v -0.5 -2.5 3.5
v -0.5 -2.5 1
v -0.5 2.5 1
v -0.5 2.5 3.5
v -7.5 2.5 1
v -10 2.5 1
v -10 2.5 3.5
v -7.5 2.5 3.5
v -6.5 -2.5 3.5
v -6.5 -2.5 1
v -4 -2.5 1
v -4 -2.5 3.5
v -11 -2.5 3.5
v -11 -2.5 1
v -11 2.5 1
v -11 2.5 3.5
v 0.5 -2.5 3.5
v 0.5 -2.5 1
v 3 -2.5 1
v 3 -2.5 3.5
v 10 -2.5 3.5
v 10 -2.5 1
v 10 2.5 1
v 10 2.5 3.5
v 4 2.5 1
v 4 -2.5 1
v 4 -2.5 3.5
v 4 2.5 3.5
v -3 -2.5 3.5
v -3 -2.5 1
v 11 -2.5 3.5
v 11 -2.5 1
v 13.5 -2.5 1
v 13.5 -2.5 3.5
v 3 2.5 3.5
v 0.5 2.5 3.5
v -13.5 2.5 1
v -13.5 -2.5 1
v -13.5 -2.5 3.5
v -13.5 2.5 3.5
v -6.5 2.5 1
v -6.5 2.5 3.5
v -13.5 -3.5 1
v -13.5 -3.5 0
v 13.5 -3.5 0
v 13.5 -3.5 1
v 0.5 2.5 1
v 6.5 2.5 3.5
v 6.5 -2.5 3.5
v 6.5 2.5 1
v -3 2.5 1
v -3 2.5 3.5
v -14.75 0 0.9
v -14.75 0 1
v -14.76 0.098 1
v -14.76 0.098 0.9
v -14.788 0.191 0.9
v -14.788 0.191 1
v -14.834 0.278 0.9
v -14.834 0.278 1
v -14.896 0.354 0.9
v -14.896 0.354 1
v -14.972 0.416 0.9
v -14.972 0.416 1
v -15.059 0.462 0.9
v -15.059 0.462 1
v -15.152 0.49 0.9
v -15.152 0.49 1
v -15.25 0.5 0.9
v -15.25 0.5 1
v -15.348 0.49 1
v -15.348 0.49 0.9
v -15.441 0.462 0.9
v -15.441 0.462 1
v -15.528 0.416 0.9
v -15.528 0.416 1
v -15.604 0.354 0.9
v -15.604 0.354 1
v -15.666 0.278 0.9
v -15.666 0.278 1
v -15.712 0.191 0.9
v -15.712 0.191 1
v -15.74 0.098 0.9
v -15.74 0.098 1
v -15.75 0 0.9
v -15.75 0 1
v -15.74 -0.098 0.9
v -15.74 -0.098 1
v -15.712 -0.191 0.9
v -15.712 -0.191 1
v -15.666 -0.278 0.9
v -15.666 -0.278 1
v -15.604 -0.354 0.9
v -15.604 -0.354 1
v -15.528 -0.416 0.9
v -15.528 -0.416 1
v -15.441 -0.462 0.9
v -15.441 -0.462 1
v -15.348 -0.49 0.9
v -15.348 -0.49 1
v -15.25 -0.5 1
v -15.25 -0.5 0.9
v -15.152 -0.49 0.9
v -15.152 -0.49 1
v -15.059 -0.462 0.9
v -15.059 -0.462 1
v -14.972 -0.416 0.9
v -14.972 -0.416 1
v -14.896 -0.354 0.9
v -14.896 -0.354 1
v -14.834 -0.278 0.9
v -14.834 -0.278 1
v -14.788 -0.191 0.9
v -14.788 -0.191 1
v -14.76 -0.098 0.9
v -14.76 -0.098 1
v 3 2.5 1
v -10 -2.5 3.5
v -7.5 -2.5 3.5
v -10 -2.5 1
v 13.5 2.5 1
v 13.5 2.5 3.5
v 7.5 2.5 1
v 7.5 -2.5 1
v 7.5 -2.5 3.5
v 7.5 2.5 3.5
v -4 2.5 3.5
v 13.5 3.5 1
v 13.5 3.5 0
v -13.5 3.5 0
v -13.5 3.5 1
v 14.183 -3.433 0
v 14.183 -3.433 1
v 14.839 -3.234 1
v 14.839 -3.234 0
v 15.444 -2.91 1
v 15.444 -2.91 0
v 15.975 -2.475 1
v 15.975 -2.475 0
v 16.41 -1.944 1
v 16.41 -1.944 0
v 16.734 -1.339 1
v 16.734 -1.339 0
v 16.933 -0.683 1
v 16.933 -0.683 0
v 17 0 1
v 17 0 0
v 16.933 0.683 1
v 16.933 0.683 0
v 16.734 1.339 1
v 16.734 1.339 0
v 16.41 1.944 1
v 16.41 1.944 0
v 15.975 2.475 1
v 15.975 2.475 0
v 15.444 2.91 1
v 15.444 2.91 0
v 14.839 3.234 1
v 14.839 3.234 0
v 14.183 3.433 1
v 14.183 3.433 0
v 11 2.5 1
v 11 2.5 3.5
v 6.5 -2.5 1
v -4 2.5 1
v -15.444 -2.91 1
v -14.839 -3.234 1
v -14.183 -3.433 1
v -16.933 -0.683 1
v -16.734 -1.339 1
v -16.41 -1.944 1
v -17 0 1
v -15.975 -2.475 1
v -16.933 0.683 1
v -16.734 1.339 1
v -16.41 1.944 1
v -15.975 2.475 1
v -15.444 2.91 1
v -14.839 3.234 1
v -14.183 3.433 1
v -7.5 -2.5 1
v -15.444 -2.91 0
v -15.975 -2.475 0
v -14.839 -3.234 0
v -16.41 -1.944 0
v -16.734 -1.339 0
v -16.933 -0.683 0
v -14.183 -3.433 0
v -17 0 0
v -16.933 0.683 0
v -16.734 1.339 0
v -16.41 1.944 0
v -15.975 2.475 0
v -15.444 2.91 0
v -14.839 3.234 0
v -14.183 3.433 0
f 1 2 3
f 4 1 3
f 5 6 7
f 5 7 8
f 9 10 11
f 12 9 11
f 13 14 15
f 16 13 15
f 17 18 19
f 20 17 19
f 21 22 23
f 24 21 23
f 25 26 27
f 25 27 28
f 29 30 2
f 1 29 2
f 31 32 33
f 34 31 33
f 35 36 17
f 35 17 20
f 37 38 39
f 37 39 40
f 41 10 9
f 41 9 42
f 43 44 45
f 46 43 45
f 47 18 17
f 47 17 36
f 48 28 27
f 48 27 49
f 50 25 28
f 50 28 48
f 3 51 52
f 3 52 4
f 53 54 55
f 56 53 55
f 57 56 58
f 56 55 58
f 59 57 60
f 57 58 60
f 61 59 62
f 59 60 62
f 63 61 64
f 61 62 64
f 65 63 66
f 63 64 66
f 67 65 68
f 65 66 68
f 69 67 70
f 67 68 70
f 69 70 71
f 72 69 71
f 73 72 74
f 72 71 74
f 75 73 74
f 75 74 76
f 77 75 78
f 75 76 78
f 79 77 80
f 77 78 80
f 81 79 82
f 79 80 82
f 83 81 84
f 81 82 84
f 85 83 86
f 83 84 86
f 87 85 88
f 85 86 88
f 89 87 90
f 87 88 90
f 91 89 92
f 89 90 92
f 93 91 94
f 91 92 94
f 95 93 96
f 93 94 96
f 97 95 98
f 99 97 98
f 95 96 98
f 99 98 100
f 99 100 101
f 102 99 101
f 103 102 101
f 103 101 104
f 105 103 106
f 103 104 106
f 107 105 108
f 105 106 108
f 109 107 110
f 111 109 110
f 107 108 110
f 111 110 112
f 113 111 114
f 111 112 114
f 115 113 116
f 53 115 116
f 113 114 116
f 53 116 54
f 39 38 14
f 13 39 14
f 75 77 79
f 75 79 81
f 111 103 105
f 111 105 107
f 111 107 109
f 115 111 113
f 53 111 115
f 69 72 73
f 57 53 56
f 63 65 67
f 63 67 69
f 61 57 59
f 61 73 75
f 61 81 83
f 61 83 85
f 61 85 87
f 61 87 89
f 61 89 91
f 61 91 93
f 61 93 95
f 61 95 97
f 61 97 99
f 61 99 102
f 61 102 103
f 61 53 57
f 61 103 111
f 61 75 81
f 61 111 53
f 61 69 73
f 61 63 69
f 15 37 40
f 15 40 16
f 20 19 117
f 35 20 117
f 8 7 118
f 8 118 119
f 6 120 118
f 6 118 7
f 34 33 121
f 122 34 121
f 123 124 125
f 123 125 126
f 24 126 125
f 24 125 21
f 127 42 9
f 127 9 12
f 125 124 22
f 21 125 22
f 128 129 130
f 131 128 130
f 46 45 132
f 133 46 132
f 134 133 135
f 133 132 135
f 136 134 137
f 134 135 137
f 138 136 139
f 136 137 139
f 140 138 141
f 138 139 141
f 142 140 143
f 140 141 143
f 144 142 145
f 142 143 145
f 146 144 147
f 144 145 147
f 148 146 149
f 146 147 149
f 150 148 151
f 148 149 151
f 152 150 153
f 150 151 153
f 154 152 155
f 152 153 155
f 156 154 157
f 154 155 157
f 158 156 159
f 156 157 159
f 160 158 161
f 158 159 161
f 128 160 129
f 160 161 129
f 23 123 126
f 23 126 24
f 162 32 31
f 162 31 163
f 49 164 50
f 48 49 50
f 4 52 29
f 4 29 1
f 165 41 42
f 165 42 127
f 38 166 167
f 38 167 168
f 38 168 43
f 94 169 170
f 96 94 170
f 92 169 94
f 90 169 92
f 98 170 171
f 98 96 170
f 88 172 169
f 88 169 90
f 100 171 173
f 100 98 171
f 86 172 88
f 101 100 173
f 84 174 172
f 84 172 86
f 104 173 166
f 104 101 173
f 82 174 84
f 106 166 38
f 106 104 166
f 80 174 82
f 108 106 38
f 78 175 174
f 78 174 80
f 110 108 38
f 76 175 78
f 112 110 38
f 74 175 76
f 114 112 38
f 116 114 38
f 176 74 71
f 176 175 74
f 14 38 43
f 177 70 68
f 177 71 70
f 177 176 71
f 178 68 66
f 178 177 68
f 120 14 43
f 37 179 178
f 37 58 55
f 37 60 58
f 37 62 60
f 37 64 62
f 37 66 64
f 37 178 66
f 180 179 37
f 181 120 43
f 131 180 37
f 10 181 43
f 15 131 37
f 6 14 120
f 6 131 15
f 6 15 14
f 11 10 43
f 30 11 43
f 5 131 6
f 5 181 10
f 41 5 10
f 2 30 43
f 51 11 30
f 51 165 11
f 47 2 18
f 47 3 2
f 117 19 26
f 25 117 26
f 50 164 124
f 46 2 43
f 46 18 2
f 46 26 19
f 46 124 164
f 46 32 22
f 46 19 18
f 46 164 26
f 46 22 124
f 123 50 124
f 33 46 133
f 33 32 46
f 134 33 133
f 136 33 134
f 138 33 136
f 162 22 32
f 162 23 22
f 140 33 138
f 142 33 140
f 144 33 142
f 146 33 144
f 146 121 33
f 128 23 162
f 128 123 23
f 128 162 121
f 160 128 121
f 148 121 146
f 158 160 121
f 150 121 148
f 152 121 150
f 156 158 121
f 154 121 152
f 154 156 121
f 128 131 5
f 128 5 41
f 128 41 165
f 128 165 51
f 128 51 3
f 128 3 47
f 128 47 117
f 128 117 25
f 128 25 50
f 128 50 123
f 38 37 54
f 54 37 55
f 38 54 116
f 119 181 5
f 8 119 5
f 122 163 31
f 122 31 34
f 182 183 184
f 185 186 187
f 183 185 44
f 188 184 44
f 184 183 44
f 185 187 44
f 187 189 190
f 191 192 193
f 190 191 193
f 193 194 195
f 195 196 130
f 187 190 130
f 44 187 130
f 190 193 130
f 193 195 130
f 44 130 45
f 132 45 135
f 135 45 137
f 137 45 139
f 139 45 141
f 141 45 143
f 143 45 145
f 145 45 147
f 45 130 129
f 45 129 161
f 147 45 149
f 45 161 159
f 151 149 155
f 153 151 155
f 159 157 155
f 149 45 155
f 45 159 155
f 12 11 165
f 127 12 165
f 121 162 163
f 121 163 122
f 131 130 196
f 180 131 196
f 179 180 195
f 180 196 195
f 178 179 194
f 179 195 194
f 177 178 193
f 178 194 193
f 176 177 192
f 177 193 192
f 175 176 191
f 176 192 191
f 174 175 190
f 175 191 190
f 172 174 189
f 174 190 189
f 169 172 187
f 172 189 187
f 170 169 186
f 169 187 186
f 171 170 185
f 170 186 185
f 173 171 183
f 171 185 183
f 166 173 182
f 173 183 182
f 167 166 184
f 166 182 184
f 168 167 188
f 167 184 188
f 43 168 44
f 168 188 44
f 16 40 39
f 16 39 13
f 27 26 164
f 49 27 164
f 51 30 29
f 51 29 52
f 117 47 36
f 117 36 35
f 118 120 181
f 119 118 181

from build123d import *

# Parameters (mm, degrees)
F1_DEPTH = 1
F2_W     = 2.5
F2_H     = 5
F3_DEPTH = 2.5
F5_DEPTH = 0.1


# Not quite as in the source:
# - a feature names something its author has since deleted; it is built from what else it names


with BuildPart() as f1:
    # F0 (on Top) → F1 (new body)
    with BuildSketch(Plane.XY):
        with BuildLine():
            Line((0, 3.5), (-13.5, 3.5))
            ThreePointArc((-13.5, 3.5), (-17, 0), (-13.5, -3.5))
            Line((-13.5, -3.5), (0, -3.5))
            Line((0, -3.5), (13.5, -3.5))
            ThreePointArc((13.5, -3.5), (17, 0), (13.5, 3.5))
            Line((13.5, 3.5), (0, 3.5))
        make_face()
    extrude(amount=F1_DEPTH)

    # F2 (on face) → F3 (join)
    with BuildSketch(Plane.XY.offset(1)):
        with Locations((-12.25, 0)):
            Rectangle(F2_W, F2_H)
        with Locations((12.25, 0)):
            Rectangle(F2_W, F2_H)
        with Locations((-8.75, 0)):
            Rectangle(F2_W, F2_H)
        with Locations((-5.25, 0)):
            Rectangle(F2_W, F2_H)
        with Locations((-1.75, 0)):
            Rectangle(F2_W, F2_H)
        with Locations((1.75, 0)):
            Rectangle(F2_W, F2_H)
        with Locations((5.25, 0)):
            Rectangle(F2_W, F2_H)
        with Locations((8.75, 0)):
            Rectangle(F2_W, F2_H)
    extrude(amount=F3_DEPTH)

    # F4 (on face) → F5 (cut)
    with BuildSketch(Plane.XY.offset(1)):
        with BuildLine():
            ThreePointArc((-15.75, 0), (-15.25, -0.5), (-14.75, 0))
            ThreePointArc((-14.75, 0), (-15.25, 0.5), (-15.75, 0))
        make_face()
    extrude(amount=-F5_DEPTH, mode=Mode.SUBTRACT)


solid = f1.part
